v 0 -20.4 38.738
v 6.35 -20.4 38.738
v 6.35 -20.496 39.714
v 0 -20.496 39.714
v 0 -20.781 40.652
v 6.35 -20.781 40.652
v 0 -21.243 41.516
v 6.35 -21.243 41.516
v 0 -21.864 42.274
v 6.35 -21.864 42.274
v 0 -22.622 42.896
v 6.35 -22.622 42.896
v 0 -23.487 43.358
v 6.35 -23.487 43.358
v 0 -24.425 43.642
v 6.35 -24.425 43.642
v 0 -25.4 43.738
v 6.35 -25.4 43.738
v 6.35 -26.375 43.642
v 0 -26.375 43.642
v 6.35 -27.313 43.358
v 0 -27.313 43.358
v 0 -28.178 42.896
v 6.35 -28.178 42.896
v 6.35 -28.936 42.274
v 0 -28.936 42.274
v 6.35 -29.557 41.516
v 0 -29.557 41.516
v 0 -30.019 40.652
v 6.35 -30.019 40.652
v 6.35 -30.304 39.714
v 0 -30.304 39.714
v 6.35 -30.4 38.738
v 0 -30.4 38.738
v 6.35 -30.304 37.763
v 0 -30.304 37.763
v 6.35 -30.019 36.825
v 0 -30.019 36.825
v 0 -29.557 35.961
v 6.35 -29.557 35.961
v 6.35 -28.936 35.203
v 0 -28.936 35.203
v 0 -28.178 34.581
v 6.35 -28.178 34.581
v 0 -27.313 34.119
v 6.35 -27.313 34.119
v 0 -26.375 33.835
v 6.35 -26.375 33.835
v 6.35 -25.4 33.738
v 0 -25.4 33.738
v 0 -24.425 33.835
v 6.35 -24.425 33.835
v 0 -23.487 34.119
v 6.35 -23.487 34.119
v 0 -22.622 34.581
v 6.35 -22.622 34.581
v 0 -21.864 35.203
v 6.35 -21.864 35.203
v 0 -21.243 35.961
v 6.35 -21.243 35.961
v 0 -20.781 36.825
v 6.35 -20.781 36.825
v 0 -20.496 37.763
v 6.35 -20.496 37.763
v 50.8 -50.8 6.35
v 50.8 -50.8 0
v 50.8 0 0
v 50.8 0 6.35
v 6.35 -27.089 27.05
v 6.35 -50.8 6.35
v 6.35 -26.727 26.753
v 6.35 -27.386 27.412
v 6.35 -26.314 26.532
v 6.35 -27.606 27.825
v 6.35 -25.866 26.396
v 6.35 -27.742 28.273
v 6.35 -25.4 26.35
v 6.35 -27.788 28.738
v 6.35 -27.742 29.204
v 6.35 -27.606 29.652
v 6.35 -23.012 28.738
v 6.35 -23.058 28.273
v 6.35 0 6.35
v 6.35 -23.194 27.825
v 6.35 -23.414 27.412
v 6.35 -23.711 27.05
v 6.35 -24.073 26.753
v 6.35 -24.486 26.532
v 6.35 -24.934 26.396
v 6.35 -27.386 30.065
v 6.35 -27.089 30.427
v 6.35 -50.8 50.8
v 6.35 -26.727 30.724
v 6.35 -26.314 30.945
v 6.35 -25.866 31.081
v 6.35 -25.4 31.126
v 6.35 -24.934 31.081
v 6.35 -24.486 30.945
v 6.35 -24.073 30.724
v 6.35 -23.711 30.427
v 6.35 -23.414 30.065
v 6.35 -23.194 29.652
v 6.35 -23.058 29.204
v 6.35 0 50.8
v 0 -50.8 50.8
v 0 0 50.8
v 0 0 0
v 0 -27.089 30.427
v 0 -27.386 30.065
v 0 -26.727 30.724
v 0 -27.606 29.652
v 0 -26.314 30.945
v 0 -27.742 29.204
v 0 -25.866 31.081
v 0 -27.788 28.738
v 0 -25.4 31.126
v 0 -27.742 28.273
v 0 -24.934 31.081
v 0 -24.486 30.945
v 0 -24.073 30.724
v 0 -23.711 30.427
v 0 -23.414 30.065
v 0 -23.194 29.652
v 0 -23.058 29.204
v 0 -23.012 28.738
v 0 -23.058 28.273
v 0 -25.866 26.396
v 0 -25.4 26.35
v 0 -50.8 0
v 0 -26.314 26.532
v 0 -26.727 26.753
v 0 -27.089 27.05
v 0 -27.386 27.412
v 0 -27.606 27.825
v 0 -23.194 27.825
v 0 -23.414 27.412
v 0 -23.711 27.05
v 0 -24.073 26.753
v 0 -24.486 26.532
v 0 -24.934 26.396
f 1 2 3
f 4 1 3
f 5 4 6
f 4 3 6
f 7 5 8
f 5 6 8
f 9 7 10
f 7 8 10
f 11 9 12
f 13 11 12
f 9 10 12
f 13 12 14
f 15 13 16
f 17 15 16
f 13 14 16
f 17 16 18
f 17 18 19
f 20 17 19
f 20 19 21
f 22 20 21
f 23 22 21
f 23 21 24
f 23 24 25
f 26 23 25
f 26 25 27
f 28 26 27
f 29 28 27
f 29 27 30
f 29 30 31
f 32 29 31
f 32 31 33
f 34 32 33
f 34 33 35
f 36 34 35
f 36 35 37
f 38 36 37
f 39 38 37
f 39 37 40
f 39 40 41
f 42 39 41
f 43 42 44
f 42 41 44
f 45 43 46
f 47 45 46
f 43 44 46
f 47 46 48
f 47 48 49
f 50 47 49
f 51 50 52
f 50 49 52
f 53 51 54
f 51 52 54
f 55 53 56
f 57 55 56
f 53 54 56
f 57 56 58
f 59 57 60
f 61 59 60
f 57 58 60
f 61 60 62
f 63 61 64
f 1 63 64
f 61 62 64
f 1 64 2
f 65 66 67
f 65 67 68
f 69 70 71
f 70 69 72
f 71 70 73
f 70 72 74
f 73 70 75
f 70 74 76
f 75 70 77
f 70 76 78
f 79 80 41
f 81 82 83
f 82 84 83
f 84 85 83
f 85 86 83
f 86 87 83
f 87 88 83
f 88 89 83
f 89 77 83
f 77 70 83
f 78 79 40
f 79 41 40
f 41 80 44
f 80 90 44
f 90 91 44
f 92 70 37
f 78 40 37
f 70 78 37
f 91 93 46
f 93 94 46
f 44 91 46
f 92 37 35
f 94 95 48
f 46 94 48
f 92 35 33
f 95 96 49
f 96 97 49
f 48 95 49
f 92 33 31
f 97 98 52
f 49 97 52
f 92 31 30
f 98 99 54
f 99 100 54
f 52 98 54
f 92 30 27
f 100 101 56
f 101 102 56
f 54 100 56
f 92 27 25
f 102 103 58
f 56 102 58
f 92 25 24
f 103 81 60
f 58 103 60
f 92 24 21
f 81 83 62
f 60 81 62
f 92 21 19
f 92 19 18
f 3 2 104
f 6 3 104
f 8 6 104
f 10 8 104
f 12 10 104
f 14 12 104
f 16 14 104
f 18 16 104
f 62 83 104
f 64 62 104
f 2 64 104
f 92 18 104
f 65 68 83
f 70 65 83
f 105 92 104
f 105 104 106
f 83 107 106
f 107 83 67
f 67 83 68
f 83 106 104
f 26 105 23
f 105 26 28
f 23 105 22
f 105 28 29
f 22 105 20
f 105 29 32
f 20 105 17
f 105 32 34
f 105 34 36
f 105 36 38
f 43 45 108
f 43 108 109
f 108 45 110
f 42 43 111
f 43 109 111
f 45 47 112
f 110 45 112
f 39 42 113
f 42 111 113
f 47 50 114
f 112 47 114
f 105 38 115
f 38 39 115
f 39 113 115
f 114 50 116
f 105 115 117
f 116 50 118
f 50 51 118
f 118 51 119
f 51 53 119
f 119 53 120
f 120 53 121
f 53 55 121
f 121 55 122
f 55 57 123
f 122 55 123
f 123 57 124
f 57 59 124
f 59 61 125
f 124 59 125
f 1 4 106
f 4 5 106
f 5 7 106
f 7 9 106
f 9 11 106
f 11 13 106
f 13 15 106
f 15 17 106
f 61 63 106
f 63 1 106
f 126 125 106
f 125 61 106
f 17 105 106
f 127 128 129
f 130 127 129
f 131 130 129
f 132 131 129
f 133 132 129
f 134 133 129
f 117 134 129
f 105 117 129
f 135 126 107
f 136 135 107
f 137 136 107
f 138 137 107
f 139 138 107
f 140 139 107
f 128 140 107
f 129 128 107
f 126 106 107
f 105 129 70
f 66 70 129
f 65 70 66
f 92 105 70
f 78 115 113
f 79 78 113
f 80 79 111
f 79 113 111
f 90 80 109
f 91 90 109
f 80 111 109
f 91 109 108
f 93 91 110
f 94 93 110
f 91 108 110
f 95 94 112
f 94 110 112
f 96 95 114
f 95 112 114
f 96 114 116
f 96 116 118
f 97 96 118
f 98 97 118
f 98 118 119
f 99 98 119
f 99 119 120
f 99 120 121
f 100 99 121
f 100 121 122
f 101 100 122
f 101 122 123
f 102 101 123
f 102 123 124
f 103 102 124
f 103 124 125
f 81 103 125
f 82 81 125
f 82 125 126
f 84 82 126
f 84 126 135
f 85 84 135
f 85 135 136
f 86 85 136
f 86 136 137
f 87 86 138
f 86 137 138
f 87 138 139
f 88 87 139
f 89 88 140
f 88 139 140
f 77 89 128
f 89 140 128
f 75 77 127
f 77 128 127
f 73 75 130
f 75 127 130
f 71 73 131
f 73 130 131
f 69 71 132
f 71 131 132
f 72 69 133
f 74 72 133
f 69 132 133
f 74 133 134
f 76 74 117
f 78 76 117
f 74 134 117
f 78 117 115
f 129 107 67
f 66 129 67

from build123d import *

# Parameters (mm, degrees)
F1_DEPTH = 50.8
F2_R     = 5
F3_DEPTH = 6.351
F5_D     = 4.776


with BuildPart() as f1:
    # F0 (on Front) → F1 (new body)
    with BuildSketch(Plane.XZ):
        Polygon((0, 50.8), (0, 0), (50.8, 0), (50.8, 6.35), (6.35, 6.35), (6.35, 50.8), align=None)
    extrude(amount=F1_DEPTH)

    # F2 (on face) → F3 (cut, through all)
    with BuildSketch(Plane.YZ.offset(6.35)):
        with Locations((-25.4, 38.738448)):
            Circle(F2_R)
    extrude(amount=-F3_DEPTH, mode=Mode.SUBTRACT)

    # F5 (through all)
    with Locations(Plane.YZ.offset(6.35)):
        with Locations((-25.4, 28.738448)):
            Hole(F5_D / 2)


solid = f1.part
